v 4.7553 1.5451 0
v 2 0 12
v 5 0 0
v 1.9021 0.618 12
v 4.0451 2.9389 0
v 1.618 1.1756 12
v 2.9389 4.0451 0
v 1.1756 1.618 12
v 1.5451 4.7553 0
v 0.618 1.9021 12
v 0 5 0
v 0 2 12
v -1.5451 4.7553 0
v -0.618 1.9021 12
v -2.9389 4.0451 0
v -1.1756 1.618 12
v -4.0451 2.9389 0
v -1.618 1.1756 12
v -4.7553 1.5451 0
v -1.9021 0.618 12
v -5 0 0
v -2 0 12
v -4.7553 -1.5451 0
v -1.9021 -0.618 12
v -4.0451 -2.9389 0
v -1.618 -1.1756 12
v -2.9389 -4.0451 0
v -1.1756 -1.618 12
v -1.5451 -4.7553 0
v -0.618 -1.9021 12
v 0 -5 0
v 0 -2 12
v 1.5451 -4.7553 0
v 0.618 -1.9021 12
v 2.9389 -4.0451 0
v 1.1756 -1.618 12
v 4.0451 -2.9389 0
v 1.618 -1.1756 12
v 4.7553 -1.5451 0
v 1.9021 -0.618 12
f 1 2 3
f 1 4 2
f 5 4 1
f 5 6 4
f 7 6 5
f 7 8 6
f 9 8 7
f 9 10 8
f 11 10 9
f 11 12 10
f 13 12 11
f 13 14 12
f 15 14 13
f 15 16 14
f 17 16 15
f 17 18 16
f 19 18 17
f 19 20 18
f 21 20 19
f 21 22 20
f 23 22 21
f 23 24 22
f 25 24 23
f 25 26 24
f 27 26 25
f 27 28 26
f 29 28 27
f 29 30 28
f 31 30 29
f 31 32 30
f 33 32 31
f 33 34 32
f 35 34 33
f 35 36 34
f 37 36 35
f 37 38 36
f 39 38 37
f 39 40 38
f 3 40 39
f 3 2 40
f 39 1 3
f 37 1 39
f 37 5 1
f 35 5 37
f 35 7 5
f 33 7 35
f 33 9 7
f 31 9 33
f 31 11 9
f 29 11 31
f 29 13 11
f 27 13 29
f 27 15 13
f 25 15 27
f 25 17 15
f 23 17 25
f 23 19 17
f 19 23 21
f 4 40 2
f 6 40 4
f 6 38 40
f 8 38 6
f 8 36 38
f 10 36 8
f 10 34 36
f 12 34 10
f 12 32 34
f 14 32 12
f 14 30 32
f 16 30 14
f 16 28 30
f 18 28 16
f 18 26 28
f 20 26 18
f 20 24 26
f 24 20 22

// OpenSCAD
// d/d1/d2 must resolve to the same r/r1/r2 the oracle prints
cylinder(h = 12, d1 = 10, d2 = 4, $fn = 20);
